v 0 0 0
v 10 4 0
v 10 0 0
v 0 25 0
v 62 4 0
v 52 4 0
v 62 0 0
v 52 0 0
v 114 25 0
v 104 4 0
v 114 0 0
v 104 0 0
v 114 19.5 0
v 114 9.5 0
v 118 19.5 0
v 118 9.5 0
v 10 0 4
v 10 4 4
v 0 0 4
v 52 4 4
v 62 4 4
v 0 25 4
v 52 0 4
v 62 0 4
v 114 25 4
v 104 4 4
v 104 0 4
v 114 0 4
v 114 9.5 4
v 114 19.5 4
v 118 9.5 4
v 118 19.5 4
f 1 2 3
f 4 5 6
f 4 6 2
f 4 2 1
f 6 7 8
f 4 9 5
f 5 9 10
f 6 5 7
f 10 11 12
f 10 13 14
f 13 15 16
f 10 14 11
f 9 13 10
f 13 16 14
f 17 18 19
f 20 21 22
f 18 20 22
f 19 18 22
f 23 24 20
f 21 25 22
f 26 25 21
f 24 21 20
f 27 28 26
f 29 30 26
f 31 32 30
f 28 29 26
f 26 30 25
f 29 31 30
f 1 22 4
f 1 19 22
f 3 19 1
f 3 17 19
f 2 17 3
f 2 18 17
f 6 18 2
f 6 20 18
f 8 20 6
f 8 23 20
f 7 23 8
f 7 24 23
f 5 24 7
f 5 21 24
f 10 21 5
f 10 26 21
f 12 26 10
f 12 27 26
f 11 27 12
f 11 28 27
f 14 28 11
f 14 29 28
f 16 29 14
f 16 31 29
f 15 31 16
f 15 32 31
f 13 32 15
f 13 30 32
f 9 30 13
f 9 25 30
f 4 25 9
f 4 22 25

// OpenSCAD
// file: globals.scad
/* Copyright 2018 Guillaume JORANDON
 * 
 * This file is distributed under the terms of the MIT License.
 * Check https://opensource.org/licenses/MIT for more details.
 * 
 * ./front_core/globals.scad: global variables that apply to pieces from the front core.
 *
 * NB.: units are assumed to be millimeters.
 */

include <../globals.scad>

/* Total height of the front core */
front_core_height = 128;
/* Total length of the front core */
front_core_length = 161;
/* Total width of the front core */
front_core_width = 100;
/* height from bottom to the first lip */
front_core_partial_height = 61;
/* height from bottom of the piece to the top of the inner floor */
front_core_inner_floor_height = 40;
/* relative height between the bottom and the top of the lip */
front_core_lip_height = 4;
/* how much the lip reduces the inner core container */
front_core_lip_reduction = 16;
/* distance from the tubular core (including the back border) to the bottom of the piece */
front_core_tube_elevation = 42;
/* outer diameter of the transparent tubular core */
front_core_tube_diameter = 55;
/* size of the back border of the transparent core */
front_core_tube_back_border_size = 5;
/* lip inner slope width */
front_core_lip_inner_slope = 5;
/* thickness of the PVC tube for the lower part of the front core */
front_core_lower_tube_thickness = 3;
/* thickness of the transparent center core */
front_core_center_core_thickness = 3;
/* length of the center core tube, including the extra space in the rear core, and the extra space on the front */
front_core_center_core_length = 117 + 2*sheet_thickness;
/* distance from the front of the piece */
front_core_center_core_offset = 44;
/* length of holes to attach the floor of the piece */
front_core_floor_hole = 10;
/* distance between the two attaching holes of the floor */
front_core_floor_hole_distance = 24;
/* length of holes to attach the inner walls of the piece */
front_core_inner_walls_hole = front_core_floor_hole;
/* hole of the junction screws */
front_core_junction_hole_diameter = 5;
/* hole of the junction nuts */
front_core_junction_nut_diameter = front_core_junction_hole_diameter*2;
/* length of the front core if we remove the junction with 1B */
front_core_partial_length = 110 + 2*sheet_thickness;
// file: ../globals.scad
/* Copyright 2018 Guillaume JORANDON
 * 
 * This file is distributed under the terms of the MIT License.
 * Check https://opensource.org/licenses/MIT for more details.
 * 
 * ./globals.scad: some global variables that apply to every piece.
 *
 * NB.: units are assumed to be millimeters.
 */

/*Thickness of laser cutted sheets */
sheet_thickness = 4;
/* Margin on the printsheet */
print_margin = 3;
/* Curves accuracy */
$fn = 360;

/* Distance between the border of the bottom of the frontest plate of the rear_core and the bottom of the front core */
cores_offset = 16;
// main file
/* Copyright 2018 Guillaume JORANDON
 * 
 * This file is distributed under the terms of the MIT License.
 * Check https://opensource.org/licenses/MIT for more details.
 * 
 * ./front_core/1A.3.scad: inner side walls.
 *
 * quantity: 2
 * NB.: units are assumed to be millimeters.
 */

include <../globals.scad>
include <globals.scad>

module front_core_inner_floor_side_holes() {
    square([ front_core_inner_walls_hole, sheet_thickness]);
        translate([(front_core_partial_length-sheet_thickness-front_core_inner_walls_hole)/2, 0, 0]) square([ front_core_inner_walls_hole, sheet_thickness]);
        translate([front_core_partial_length-sheet_thickness-front_core_inner_walls_hole, 0, 0]) square([ front_core_inner_walls_hole, sheet_thickness]);
}

module front_core_1A_3() {
    translate([0, sheet_thickness, 0]) {
        square([front_core_partial_length-sheet_thickness, front_core_partial_height-front_core_inner_floor_height]);
        translate([front_core_partial_length-sheet_thickness, (front_core_partial_height-front_core_inner_floor_height - front_core_inner_walls_hole)/2, 0]) square([sheet_thickness, front_core_inner_walls_hole]);
        translate([0, -sheet_thickness, 0]) front_core_inner_floor_side_holes();
    }
}

linear_extrude(sheet_thickness) front_core_1A_3();
